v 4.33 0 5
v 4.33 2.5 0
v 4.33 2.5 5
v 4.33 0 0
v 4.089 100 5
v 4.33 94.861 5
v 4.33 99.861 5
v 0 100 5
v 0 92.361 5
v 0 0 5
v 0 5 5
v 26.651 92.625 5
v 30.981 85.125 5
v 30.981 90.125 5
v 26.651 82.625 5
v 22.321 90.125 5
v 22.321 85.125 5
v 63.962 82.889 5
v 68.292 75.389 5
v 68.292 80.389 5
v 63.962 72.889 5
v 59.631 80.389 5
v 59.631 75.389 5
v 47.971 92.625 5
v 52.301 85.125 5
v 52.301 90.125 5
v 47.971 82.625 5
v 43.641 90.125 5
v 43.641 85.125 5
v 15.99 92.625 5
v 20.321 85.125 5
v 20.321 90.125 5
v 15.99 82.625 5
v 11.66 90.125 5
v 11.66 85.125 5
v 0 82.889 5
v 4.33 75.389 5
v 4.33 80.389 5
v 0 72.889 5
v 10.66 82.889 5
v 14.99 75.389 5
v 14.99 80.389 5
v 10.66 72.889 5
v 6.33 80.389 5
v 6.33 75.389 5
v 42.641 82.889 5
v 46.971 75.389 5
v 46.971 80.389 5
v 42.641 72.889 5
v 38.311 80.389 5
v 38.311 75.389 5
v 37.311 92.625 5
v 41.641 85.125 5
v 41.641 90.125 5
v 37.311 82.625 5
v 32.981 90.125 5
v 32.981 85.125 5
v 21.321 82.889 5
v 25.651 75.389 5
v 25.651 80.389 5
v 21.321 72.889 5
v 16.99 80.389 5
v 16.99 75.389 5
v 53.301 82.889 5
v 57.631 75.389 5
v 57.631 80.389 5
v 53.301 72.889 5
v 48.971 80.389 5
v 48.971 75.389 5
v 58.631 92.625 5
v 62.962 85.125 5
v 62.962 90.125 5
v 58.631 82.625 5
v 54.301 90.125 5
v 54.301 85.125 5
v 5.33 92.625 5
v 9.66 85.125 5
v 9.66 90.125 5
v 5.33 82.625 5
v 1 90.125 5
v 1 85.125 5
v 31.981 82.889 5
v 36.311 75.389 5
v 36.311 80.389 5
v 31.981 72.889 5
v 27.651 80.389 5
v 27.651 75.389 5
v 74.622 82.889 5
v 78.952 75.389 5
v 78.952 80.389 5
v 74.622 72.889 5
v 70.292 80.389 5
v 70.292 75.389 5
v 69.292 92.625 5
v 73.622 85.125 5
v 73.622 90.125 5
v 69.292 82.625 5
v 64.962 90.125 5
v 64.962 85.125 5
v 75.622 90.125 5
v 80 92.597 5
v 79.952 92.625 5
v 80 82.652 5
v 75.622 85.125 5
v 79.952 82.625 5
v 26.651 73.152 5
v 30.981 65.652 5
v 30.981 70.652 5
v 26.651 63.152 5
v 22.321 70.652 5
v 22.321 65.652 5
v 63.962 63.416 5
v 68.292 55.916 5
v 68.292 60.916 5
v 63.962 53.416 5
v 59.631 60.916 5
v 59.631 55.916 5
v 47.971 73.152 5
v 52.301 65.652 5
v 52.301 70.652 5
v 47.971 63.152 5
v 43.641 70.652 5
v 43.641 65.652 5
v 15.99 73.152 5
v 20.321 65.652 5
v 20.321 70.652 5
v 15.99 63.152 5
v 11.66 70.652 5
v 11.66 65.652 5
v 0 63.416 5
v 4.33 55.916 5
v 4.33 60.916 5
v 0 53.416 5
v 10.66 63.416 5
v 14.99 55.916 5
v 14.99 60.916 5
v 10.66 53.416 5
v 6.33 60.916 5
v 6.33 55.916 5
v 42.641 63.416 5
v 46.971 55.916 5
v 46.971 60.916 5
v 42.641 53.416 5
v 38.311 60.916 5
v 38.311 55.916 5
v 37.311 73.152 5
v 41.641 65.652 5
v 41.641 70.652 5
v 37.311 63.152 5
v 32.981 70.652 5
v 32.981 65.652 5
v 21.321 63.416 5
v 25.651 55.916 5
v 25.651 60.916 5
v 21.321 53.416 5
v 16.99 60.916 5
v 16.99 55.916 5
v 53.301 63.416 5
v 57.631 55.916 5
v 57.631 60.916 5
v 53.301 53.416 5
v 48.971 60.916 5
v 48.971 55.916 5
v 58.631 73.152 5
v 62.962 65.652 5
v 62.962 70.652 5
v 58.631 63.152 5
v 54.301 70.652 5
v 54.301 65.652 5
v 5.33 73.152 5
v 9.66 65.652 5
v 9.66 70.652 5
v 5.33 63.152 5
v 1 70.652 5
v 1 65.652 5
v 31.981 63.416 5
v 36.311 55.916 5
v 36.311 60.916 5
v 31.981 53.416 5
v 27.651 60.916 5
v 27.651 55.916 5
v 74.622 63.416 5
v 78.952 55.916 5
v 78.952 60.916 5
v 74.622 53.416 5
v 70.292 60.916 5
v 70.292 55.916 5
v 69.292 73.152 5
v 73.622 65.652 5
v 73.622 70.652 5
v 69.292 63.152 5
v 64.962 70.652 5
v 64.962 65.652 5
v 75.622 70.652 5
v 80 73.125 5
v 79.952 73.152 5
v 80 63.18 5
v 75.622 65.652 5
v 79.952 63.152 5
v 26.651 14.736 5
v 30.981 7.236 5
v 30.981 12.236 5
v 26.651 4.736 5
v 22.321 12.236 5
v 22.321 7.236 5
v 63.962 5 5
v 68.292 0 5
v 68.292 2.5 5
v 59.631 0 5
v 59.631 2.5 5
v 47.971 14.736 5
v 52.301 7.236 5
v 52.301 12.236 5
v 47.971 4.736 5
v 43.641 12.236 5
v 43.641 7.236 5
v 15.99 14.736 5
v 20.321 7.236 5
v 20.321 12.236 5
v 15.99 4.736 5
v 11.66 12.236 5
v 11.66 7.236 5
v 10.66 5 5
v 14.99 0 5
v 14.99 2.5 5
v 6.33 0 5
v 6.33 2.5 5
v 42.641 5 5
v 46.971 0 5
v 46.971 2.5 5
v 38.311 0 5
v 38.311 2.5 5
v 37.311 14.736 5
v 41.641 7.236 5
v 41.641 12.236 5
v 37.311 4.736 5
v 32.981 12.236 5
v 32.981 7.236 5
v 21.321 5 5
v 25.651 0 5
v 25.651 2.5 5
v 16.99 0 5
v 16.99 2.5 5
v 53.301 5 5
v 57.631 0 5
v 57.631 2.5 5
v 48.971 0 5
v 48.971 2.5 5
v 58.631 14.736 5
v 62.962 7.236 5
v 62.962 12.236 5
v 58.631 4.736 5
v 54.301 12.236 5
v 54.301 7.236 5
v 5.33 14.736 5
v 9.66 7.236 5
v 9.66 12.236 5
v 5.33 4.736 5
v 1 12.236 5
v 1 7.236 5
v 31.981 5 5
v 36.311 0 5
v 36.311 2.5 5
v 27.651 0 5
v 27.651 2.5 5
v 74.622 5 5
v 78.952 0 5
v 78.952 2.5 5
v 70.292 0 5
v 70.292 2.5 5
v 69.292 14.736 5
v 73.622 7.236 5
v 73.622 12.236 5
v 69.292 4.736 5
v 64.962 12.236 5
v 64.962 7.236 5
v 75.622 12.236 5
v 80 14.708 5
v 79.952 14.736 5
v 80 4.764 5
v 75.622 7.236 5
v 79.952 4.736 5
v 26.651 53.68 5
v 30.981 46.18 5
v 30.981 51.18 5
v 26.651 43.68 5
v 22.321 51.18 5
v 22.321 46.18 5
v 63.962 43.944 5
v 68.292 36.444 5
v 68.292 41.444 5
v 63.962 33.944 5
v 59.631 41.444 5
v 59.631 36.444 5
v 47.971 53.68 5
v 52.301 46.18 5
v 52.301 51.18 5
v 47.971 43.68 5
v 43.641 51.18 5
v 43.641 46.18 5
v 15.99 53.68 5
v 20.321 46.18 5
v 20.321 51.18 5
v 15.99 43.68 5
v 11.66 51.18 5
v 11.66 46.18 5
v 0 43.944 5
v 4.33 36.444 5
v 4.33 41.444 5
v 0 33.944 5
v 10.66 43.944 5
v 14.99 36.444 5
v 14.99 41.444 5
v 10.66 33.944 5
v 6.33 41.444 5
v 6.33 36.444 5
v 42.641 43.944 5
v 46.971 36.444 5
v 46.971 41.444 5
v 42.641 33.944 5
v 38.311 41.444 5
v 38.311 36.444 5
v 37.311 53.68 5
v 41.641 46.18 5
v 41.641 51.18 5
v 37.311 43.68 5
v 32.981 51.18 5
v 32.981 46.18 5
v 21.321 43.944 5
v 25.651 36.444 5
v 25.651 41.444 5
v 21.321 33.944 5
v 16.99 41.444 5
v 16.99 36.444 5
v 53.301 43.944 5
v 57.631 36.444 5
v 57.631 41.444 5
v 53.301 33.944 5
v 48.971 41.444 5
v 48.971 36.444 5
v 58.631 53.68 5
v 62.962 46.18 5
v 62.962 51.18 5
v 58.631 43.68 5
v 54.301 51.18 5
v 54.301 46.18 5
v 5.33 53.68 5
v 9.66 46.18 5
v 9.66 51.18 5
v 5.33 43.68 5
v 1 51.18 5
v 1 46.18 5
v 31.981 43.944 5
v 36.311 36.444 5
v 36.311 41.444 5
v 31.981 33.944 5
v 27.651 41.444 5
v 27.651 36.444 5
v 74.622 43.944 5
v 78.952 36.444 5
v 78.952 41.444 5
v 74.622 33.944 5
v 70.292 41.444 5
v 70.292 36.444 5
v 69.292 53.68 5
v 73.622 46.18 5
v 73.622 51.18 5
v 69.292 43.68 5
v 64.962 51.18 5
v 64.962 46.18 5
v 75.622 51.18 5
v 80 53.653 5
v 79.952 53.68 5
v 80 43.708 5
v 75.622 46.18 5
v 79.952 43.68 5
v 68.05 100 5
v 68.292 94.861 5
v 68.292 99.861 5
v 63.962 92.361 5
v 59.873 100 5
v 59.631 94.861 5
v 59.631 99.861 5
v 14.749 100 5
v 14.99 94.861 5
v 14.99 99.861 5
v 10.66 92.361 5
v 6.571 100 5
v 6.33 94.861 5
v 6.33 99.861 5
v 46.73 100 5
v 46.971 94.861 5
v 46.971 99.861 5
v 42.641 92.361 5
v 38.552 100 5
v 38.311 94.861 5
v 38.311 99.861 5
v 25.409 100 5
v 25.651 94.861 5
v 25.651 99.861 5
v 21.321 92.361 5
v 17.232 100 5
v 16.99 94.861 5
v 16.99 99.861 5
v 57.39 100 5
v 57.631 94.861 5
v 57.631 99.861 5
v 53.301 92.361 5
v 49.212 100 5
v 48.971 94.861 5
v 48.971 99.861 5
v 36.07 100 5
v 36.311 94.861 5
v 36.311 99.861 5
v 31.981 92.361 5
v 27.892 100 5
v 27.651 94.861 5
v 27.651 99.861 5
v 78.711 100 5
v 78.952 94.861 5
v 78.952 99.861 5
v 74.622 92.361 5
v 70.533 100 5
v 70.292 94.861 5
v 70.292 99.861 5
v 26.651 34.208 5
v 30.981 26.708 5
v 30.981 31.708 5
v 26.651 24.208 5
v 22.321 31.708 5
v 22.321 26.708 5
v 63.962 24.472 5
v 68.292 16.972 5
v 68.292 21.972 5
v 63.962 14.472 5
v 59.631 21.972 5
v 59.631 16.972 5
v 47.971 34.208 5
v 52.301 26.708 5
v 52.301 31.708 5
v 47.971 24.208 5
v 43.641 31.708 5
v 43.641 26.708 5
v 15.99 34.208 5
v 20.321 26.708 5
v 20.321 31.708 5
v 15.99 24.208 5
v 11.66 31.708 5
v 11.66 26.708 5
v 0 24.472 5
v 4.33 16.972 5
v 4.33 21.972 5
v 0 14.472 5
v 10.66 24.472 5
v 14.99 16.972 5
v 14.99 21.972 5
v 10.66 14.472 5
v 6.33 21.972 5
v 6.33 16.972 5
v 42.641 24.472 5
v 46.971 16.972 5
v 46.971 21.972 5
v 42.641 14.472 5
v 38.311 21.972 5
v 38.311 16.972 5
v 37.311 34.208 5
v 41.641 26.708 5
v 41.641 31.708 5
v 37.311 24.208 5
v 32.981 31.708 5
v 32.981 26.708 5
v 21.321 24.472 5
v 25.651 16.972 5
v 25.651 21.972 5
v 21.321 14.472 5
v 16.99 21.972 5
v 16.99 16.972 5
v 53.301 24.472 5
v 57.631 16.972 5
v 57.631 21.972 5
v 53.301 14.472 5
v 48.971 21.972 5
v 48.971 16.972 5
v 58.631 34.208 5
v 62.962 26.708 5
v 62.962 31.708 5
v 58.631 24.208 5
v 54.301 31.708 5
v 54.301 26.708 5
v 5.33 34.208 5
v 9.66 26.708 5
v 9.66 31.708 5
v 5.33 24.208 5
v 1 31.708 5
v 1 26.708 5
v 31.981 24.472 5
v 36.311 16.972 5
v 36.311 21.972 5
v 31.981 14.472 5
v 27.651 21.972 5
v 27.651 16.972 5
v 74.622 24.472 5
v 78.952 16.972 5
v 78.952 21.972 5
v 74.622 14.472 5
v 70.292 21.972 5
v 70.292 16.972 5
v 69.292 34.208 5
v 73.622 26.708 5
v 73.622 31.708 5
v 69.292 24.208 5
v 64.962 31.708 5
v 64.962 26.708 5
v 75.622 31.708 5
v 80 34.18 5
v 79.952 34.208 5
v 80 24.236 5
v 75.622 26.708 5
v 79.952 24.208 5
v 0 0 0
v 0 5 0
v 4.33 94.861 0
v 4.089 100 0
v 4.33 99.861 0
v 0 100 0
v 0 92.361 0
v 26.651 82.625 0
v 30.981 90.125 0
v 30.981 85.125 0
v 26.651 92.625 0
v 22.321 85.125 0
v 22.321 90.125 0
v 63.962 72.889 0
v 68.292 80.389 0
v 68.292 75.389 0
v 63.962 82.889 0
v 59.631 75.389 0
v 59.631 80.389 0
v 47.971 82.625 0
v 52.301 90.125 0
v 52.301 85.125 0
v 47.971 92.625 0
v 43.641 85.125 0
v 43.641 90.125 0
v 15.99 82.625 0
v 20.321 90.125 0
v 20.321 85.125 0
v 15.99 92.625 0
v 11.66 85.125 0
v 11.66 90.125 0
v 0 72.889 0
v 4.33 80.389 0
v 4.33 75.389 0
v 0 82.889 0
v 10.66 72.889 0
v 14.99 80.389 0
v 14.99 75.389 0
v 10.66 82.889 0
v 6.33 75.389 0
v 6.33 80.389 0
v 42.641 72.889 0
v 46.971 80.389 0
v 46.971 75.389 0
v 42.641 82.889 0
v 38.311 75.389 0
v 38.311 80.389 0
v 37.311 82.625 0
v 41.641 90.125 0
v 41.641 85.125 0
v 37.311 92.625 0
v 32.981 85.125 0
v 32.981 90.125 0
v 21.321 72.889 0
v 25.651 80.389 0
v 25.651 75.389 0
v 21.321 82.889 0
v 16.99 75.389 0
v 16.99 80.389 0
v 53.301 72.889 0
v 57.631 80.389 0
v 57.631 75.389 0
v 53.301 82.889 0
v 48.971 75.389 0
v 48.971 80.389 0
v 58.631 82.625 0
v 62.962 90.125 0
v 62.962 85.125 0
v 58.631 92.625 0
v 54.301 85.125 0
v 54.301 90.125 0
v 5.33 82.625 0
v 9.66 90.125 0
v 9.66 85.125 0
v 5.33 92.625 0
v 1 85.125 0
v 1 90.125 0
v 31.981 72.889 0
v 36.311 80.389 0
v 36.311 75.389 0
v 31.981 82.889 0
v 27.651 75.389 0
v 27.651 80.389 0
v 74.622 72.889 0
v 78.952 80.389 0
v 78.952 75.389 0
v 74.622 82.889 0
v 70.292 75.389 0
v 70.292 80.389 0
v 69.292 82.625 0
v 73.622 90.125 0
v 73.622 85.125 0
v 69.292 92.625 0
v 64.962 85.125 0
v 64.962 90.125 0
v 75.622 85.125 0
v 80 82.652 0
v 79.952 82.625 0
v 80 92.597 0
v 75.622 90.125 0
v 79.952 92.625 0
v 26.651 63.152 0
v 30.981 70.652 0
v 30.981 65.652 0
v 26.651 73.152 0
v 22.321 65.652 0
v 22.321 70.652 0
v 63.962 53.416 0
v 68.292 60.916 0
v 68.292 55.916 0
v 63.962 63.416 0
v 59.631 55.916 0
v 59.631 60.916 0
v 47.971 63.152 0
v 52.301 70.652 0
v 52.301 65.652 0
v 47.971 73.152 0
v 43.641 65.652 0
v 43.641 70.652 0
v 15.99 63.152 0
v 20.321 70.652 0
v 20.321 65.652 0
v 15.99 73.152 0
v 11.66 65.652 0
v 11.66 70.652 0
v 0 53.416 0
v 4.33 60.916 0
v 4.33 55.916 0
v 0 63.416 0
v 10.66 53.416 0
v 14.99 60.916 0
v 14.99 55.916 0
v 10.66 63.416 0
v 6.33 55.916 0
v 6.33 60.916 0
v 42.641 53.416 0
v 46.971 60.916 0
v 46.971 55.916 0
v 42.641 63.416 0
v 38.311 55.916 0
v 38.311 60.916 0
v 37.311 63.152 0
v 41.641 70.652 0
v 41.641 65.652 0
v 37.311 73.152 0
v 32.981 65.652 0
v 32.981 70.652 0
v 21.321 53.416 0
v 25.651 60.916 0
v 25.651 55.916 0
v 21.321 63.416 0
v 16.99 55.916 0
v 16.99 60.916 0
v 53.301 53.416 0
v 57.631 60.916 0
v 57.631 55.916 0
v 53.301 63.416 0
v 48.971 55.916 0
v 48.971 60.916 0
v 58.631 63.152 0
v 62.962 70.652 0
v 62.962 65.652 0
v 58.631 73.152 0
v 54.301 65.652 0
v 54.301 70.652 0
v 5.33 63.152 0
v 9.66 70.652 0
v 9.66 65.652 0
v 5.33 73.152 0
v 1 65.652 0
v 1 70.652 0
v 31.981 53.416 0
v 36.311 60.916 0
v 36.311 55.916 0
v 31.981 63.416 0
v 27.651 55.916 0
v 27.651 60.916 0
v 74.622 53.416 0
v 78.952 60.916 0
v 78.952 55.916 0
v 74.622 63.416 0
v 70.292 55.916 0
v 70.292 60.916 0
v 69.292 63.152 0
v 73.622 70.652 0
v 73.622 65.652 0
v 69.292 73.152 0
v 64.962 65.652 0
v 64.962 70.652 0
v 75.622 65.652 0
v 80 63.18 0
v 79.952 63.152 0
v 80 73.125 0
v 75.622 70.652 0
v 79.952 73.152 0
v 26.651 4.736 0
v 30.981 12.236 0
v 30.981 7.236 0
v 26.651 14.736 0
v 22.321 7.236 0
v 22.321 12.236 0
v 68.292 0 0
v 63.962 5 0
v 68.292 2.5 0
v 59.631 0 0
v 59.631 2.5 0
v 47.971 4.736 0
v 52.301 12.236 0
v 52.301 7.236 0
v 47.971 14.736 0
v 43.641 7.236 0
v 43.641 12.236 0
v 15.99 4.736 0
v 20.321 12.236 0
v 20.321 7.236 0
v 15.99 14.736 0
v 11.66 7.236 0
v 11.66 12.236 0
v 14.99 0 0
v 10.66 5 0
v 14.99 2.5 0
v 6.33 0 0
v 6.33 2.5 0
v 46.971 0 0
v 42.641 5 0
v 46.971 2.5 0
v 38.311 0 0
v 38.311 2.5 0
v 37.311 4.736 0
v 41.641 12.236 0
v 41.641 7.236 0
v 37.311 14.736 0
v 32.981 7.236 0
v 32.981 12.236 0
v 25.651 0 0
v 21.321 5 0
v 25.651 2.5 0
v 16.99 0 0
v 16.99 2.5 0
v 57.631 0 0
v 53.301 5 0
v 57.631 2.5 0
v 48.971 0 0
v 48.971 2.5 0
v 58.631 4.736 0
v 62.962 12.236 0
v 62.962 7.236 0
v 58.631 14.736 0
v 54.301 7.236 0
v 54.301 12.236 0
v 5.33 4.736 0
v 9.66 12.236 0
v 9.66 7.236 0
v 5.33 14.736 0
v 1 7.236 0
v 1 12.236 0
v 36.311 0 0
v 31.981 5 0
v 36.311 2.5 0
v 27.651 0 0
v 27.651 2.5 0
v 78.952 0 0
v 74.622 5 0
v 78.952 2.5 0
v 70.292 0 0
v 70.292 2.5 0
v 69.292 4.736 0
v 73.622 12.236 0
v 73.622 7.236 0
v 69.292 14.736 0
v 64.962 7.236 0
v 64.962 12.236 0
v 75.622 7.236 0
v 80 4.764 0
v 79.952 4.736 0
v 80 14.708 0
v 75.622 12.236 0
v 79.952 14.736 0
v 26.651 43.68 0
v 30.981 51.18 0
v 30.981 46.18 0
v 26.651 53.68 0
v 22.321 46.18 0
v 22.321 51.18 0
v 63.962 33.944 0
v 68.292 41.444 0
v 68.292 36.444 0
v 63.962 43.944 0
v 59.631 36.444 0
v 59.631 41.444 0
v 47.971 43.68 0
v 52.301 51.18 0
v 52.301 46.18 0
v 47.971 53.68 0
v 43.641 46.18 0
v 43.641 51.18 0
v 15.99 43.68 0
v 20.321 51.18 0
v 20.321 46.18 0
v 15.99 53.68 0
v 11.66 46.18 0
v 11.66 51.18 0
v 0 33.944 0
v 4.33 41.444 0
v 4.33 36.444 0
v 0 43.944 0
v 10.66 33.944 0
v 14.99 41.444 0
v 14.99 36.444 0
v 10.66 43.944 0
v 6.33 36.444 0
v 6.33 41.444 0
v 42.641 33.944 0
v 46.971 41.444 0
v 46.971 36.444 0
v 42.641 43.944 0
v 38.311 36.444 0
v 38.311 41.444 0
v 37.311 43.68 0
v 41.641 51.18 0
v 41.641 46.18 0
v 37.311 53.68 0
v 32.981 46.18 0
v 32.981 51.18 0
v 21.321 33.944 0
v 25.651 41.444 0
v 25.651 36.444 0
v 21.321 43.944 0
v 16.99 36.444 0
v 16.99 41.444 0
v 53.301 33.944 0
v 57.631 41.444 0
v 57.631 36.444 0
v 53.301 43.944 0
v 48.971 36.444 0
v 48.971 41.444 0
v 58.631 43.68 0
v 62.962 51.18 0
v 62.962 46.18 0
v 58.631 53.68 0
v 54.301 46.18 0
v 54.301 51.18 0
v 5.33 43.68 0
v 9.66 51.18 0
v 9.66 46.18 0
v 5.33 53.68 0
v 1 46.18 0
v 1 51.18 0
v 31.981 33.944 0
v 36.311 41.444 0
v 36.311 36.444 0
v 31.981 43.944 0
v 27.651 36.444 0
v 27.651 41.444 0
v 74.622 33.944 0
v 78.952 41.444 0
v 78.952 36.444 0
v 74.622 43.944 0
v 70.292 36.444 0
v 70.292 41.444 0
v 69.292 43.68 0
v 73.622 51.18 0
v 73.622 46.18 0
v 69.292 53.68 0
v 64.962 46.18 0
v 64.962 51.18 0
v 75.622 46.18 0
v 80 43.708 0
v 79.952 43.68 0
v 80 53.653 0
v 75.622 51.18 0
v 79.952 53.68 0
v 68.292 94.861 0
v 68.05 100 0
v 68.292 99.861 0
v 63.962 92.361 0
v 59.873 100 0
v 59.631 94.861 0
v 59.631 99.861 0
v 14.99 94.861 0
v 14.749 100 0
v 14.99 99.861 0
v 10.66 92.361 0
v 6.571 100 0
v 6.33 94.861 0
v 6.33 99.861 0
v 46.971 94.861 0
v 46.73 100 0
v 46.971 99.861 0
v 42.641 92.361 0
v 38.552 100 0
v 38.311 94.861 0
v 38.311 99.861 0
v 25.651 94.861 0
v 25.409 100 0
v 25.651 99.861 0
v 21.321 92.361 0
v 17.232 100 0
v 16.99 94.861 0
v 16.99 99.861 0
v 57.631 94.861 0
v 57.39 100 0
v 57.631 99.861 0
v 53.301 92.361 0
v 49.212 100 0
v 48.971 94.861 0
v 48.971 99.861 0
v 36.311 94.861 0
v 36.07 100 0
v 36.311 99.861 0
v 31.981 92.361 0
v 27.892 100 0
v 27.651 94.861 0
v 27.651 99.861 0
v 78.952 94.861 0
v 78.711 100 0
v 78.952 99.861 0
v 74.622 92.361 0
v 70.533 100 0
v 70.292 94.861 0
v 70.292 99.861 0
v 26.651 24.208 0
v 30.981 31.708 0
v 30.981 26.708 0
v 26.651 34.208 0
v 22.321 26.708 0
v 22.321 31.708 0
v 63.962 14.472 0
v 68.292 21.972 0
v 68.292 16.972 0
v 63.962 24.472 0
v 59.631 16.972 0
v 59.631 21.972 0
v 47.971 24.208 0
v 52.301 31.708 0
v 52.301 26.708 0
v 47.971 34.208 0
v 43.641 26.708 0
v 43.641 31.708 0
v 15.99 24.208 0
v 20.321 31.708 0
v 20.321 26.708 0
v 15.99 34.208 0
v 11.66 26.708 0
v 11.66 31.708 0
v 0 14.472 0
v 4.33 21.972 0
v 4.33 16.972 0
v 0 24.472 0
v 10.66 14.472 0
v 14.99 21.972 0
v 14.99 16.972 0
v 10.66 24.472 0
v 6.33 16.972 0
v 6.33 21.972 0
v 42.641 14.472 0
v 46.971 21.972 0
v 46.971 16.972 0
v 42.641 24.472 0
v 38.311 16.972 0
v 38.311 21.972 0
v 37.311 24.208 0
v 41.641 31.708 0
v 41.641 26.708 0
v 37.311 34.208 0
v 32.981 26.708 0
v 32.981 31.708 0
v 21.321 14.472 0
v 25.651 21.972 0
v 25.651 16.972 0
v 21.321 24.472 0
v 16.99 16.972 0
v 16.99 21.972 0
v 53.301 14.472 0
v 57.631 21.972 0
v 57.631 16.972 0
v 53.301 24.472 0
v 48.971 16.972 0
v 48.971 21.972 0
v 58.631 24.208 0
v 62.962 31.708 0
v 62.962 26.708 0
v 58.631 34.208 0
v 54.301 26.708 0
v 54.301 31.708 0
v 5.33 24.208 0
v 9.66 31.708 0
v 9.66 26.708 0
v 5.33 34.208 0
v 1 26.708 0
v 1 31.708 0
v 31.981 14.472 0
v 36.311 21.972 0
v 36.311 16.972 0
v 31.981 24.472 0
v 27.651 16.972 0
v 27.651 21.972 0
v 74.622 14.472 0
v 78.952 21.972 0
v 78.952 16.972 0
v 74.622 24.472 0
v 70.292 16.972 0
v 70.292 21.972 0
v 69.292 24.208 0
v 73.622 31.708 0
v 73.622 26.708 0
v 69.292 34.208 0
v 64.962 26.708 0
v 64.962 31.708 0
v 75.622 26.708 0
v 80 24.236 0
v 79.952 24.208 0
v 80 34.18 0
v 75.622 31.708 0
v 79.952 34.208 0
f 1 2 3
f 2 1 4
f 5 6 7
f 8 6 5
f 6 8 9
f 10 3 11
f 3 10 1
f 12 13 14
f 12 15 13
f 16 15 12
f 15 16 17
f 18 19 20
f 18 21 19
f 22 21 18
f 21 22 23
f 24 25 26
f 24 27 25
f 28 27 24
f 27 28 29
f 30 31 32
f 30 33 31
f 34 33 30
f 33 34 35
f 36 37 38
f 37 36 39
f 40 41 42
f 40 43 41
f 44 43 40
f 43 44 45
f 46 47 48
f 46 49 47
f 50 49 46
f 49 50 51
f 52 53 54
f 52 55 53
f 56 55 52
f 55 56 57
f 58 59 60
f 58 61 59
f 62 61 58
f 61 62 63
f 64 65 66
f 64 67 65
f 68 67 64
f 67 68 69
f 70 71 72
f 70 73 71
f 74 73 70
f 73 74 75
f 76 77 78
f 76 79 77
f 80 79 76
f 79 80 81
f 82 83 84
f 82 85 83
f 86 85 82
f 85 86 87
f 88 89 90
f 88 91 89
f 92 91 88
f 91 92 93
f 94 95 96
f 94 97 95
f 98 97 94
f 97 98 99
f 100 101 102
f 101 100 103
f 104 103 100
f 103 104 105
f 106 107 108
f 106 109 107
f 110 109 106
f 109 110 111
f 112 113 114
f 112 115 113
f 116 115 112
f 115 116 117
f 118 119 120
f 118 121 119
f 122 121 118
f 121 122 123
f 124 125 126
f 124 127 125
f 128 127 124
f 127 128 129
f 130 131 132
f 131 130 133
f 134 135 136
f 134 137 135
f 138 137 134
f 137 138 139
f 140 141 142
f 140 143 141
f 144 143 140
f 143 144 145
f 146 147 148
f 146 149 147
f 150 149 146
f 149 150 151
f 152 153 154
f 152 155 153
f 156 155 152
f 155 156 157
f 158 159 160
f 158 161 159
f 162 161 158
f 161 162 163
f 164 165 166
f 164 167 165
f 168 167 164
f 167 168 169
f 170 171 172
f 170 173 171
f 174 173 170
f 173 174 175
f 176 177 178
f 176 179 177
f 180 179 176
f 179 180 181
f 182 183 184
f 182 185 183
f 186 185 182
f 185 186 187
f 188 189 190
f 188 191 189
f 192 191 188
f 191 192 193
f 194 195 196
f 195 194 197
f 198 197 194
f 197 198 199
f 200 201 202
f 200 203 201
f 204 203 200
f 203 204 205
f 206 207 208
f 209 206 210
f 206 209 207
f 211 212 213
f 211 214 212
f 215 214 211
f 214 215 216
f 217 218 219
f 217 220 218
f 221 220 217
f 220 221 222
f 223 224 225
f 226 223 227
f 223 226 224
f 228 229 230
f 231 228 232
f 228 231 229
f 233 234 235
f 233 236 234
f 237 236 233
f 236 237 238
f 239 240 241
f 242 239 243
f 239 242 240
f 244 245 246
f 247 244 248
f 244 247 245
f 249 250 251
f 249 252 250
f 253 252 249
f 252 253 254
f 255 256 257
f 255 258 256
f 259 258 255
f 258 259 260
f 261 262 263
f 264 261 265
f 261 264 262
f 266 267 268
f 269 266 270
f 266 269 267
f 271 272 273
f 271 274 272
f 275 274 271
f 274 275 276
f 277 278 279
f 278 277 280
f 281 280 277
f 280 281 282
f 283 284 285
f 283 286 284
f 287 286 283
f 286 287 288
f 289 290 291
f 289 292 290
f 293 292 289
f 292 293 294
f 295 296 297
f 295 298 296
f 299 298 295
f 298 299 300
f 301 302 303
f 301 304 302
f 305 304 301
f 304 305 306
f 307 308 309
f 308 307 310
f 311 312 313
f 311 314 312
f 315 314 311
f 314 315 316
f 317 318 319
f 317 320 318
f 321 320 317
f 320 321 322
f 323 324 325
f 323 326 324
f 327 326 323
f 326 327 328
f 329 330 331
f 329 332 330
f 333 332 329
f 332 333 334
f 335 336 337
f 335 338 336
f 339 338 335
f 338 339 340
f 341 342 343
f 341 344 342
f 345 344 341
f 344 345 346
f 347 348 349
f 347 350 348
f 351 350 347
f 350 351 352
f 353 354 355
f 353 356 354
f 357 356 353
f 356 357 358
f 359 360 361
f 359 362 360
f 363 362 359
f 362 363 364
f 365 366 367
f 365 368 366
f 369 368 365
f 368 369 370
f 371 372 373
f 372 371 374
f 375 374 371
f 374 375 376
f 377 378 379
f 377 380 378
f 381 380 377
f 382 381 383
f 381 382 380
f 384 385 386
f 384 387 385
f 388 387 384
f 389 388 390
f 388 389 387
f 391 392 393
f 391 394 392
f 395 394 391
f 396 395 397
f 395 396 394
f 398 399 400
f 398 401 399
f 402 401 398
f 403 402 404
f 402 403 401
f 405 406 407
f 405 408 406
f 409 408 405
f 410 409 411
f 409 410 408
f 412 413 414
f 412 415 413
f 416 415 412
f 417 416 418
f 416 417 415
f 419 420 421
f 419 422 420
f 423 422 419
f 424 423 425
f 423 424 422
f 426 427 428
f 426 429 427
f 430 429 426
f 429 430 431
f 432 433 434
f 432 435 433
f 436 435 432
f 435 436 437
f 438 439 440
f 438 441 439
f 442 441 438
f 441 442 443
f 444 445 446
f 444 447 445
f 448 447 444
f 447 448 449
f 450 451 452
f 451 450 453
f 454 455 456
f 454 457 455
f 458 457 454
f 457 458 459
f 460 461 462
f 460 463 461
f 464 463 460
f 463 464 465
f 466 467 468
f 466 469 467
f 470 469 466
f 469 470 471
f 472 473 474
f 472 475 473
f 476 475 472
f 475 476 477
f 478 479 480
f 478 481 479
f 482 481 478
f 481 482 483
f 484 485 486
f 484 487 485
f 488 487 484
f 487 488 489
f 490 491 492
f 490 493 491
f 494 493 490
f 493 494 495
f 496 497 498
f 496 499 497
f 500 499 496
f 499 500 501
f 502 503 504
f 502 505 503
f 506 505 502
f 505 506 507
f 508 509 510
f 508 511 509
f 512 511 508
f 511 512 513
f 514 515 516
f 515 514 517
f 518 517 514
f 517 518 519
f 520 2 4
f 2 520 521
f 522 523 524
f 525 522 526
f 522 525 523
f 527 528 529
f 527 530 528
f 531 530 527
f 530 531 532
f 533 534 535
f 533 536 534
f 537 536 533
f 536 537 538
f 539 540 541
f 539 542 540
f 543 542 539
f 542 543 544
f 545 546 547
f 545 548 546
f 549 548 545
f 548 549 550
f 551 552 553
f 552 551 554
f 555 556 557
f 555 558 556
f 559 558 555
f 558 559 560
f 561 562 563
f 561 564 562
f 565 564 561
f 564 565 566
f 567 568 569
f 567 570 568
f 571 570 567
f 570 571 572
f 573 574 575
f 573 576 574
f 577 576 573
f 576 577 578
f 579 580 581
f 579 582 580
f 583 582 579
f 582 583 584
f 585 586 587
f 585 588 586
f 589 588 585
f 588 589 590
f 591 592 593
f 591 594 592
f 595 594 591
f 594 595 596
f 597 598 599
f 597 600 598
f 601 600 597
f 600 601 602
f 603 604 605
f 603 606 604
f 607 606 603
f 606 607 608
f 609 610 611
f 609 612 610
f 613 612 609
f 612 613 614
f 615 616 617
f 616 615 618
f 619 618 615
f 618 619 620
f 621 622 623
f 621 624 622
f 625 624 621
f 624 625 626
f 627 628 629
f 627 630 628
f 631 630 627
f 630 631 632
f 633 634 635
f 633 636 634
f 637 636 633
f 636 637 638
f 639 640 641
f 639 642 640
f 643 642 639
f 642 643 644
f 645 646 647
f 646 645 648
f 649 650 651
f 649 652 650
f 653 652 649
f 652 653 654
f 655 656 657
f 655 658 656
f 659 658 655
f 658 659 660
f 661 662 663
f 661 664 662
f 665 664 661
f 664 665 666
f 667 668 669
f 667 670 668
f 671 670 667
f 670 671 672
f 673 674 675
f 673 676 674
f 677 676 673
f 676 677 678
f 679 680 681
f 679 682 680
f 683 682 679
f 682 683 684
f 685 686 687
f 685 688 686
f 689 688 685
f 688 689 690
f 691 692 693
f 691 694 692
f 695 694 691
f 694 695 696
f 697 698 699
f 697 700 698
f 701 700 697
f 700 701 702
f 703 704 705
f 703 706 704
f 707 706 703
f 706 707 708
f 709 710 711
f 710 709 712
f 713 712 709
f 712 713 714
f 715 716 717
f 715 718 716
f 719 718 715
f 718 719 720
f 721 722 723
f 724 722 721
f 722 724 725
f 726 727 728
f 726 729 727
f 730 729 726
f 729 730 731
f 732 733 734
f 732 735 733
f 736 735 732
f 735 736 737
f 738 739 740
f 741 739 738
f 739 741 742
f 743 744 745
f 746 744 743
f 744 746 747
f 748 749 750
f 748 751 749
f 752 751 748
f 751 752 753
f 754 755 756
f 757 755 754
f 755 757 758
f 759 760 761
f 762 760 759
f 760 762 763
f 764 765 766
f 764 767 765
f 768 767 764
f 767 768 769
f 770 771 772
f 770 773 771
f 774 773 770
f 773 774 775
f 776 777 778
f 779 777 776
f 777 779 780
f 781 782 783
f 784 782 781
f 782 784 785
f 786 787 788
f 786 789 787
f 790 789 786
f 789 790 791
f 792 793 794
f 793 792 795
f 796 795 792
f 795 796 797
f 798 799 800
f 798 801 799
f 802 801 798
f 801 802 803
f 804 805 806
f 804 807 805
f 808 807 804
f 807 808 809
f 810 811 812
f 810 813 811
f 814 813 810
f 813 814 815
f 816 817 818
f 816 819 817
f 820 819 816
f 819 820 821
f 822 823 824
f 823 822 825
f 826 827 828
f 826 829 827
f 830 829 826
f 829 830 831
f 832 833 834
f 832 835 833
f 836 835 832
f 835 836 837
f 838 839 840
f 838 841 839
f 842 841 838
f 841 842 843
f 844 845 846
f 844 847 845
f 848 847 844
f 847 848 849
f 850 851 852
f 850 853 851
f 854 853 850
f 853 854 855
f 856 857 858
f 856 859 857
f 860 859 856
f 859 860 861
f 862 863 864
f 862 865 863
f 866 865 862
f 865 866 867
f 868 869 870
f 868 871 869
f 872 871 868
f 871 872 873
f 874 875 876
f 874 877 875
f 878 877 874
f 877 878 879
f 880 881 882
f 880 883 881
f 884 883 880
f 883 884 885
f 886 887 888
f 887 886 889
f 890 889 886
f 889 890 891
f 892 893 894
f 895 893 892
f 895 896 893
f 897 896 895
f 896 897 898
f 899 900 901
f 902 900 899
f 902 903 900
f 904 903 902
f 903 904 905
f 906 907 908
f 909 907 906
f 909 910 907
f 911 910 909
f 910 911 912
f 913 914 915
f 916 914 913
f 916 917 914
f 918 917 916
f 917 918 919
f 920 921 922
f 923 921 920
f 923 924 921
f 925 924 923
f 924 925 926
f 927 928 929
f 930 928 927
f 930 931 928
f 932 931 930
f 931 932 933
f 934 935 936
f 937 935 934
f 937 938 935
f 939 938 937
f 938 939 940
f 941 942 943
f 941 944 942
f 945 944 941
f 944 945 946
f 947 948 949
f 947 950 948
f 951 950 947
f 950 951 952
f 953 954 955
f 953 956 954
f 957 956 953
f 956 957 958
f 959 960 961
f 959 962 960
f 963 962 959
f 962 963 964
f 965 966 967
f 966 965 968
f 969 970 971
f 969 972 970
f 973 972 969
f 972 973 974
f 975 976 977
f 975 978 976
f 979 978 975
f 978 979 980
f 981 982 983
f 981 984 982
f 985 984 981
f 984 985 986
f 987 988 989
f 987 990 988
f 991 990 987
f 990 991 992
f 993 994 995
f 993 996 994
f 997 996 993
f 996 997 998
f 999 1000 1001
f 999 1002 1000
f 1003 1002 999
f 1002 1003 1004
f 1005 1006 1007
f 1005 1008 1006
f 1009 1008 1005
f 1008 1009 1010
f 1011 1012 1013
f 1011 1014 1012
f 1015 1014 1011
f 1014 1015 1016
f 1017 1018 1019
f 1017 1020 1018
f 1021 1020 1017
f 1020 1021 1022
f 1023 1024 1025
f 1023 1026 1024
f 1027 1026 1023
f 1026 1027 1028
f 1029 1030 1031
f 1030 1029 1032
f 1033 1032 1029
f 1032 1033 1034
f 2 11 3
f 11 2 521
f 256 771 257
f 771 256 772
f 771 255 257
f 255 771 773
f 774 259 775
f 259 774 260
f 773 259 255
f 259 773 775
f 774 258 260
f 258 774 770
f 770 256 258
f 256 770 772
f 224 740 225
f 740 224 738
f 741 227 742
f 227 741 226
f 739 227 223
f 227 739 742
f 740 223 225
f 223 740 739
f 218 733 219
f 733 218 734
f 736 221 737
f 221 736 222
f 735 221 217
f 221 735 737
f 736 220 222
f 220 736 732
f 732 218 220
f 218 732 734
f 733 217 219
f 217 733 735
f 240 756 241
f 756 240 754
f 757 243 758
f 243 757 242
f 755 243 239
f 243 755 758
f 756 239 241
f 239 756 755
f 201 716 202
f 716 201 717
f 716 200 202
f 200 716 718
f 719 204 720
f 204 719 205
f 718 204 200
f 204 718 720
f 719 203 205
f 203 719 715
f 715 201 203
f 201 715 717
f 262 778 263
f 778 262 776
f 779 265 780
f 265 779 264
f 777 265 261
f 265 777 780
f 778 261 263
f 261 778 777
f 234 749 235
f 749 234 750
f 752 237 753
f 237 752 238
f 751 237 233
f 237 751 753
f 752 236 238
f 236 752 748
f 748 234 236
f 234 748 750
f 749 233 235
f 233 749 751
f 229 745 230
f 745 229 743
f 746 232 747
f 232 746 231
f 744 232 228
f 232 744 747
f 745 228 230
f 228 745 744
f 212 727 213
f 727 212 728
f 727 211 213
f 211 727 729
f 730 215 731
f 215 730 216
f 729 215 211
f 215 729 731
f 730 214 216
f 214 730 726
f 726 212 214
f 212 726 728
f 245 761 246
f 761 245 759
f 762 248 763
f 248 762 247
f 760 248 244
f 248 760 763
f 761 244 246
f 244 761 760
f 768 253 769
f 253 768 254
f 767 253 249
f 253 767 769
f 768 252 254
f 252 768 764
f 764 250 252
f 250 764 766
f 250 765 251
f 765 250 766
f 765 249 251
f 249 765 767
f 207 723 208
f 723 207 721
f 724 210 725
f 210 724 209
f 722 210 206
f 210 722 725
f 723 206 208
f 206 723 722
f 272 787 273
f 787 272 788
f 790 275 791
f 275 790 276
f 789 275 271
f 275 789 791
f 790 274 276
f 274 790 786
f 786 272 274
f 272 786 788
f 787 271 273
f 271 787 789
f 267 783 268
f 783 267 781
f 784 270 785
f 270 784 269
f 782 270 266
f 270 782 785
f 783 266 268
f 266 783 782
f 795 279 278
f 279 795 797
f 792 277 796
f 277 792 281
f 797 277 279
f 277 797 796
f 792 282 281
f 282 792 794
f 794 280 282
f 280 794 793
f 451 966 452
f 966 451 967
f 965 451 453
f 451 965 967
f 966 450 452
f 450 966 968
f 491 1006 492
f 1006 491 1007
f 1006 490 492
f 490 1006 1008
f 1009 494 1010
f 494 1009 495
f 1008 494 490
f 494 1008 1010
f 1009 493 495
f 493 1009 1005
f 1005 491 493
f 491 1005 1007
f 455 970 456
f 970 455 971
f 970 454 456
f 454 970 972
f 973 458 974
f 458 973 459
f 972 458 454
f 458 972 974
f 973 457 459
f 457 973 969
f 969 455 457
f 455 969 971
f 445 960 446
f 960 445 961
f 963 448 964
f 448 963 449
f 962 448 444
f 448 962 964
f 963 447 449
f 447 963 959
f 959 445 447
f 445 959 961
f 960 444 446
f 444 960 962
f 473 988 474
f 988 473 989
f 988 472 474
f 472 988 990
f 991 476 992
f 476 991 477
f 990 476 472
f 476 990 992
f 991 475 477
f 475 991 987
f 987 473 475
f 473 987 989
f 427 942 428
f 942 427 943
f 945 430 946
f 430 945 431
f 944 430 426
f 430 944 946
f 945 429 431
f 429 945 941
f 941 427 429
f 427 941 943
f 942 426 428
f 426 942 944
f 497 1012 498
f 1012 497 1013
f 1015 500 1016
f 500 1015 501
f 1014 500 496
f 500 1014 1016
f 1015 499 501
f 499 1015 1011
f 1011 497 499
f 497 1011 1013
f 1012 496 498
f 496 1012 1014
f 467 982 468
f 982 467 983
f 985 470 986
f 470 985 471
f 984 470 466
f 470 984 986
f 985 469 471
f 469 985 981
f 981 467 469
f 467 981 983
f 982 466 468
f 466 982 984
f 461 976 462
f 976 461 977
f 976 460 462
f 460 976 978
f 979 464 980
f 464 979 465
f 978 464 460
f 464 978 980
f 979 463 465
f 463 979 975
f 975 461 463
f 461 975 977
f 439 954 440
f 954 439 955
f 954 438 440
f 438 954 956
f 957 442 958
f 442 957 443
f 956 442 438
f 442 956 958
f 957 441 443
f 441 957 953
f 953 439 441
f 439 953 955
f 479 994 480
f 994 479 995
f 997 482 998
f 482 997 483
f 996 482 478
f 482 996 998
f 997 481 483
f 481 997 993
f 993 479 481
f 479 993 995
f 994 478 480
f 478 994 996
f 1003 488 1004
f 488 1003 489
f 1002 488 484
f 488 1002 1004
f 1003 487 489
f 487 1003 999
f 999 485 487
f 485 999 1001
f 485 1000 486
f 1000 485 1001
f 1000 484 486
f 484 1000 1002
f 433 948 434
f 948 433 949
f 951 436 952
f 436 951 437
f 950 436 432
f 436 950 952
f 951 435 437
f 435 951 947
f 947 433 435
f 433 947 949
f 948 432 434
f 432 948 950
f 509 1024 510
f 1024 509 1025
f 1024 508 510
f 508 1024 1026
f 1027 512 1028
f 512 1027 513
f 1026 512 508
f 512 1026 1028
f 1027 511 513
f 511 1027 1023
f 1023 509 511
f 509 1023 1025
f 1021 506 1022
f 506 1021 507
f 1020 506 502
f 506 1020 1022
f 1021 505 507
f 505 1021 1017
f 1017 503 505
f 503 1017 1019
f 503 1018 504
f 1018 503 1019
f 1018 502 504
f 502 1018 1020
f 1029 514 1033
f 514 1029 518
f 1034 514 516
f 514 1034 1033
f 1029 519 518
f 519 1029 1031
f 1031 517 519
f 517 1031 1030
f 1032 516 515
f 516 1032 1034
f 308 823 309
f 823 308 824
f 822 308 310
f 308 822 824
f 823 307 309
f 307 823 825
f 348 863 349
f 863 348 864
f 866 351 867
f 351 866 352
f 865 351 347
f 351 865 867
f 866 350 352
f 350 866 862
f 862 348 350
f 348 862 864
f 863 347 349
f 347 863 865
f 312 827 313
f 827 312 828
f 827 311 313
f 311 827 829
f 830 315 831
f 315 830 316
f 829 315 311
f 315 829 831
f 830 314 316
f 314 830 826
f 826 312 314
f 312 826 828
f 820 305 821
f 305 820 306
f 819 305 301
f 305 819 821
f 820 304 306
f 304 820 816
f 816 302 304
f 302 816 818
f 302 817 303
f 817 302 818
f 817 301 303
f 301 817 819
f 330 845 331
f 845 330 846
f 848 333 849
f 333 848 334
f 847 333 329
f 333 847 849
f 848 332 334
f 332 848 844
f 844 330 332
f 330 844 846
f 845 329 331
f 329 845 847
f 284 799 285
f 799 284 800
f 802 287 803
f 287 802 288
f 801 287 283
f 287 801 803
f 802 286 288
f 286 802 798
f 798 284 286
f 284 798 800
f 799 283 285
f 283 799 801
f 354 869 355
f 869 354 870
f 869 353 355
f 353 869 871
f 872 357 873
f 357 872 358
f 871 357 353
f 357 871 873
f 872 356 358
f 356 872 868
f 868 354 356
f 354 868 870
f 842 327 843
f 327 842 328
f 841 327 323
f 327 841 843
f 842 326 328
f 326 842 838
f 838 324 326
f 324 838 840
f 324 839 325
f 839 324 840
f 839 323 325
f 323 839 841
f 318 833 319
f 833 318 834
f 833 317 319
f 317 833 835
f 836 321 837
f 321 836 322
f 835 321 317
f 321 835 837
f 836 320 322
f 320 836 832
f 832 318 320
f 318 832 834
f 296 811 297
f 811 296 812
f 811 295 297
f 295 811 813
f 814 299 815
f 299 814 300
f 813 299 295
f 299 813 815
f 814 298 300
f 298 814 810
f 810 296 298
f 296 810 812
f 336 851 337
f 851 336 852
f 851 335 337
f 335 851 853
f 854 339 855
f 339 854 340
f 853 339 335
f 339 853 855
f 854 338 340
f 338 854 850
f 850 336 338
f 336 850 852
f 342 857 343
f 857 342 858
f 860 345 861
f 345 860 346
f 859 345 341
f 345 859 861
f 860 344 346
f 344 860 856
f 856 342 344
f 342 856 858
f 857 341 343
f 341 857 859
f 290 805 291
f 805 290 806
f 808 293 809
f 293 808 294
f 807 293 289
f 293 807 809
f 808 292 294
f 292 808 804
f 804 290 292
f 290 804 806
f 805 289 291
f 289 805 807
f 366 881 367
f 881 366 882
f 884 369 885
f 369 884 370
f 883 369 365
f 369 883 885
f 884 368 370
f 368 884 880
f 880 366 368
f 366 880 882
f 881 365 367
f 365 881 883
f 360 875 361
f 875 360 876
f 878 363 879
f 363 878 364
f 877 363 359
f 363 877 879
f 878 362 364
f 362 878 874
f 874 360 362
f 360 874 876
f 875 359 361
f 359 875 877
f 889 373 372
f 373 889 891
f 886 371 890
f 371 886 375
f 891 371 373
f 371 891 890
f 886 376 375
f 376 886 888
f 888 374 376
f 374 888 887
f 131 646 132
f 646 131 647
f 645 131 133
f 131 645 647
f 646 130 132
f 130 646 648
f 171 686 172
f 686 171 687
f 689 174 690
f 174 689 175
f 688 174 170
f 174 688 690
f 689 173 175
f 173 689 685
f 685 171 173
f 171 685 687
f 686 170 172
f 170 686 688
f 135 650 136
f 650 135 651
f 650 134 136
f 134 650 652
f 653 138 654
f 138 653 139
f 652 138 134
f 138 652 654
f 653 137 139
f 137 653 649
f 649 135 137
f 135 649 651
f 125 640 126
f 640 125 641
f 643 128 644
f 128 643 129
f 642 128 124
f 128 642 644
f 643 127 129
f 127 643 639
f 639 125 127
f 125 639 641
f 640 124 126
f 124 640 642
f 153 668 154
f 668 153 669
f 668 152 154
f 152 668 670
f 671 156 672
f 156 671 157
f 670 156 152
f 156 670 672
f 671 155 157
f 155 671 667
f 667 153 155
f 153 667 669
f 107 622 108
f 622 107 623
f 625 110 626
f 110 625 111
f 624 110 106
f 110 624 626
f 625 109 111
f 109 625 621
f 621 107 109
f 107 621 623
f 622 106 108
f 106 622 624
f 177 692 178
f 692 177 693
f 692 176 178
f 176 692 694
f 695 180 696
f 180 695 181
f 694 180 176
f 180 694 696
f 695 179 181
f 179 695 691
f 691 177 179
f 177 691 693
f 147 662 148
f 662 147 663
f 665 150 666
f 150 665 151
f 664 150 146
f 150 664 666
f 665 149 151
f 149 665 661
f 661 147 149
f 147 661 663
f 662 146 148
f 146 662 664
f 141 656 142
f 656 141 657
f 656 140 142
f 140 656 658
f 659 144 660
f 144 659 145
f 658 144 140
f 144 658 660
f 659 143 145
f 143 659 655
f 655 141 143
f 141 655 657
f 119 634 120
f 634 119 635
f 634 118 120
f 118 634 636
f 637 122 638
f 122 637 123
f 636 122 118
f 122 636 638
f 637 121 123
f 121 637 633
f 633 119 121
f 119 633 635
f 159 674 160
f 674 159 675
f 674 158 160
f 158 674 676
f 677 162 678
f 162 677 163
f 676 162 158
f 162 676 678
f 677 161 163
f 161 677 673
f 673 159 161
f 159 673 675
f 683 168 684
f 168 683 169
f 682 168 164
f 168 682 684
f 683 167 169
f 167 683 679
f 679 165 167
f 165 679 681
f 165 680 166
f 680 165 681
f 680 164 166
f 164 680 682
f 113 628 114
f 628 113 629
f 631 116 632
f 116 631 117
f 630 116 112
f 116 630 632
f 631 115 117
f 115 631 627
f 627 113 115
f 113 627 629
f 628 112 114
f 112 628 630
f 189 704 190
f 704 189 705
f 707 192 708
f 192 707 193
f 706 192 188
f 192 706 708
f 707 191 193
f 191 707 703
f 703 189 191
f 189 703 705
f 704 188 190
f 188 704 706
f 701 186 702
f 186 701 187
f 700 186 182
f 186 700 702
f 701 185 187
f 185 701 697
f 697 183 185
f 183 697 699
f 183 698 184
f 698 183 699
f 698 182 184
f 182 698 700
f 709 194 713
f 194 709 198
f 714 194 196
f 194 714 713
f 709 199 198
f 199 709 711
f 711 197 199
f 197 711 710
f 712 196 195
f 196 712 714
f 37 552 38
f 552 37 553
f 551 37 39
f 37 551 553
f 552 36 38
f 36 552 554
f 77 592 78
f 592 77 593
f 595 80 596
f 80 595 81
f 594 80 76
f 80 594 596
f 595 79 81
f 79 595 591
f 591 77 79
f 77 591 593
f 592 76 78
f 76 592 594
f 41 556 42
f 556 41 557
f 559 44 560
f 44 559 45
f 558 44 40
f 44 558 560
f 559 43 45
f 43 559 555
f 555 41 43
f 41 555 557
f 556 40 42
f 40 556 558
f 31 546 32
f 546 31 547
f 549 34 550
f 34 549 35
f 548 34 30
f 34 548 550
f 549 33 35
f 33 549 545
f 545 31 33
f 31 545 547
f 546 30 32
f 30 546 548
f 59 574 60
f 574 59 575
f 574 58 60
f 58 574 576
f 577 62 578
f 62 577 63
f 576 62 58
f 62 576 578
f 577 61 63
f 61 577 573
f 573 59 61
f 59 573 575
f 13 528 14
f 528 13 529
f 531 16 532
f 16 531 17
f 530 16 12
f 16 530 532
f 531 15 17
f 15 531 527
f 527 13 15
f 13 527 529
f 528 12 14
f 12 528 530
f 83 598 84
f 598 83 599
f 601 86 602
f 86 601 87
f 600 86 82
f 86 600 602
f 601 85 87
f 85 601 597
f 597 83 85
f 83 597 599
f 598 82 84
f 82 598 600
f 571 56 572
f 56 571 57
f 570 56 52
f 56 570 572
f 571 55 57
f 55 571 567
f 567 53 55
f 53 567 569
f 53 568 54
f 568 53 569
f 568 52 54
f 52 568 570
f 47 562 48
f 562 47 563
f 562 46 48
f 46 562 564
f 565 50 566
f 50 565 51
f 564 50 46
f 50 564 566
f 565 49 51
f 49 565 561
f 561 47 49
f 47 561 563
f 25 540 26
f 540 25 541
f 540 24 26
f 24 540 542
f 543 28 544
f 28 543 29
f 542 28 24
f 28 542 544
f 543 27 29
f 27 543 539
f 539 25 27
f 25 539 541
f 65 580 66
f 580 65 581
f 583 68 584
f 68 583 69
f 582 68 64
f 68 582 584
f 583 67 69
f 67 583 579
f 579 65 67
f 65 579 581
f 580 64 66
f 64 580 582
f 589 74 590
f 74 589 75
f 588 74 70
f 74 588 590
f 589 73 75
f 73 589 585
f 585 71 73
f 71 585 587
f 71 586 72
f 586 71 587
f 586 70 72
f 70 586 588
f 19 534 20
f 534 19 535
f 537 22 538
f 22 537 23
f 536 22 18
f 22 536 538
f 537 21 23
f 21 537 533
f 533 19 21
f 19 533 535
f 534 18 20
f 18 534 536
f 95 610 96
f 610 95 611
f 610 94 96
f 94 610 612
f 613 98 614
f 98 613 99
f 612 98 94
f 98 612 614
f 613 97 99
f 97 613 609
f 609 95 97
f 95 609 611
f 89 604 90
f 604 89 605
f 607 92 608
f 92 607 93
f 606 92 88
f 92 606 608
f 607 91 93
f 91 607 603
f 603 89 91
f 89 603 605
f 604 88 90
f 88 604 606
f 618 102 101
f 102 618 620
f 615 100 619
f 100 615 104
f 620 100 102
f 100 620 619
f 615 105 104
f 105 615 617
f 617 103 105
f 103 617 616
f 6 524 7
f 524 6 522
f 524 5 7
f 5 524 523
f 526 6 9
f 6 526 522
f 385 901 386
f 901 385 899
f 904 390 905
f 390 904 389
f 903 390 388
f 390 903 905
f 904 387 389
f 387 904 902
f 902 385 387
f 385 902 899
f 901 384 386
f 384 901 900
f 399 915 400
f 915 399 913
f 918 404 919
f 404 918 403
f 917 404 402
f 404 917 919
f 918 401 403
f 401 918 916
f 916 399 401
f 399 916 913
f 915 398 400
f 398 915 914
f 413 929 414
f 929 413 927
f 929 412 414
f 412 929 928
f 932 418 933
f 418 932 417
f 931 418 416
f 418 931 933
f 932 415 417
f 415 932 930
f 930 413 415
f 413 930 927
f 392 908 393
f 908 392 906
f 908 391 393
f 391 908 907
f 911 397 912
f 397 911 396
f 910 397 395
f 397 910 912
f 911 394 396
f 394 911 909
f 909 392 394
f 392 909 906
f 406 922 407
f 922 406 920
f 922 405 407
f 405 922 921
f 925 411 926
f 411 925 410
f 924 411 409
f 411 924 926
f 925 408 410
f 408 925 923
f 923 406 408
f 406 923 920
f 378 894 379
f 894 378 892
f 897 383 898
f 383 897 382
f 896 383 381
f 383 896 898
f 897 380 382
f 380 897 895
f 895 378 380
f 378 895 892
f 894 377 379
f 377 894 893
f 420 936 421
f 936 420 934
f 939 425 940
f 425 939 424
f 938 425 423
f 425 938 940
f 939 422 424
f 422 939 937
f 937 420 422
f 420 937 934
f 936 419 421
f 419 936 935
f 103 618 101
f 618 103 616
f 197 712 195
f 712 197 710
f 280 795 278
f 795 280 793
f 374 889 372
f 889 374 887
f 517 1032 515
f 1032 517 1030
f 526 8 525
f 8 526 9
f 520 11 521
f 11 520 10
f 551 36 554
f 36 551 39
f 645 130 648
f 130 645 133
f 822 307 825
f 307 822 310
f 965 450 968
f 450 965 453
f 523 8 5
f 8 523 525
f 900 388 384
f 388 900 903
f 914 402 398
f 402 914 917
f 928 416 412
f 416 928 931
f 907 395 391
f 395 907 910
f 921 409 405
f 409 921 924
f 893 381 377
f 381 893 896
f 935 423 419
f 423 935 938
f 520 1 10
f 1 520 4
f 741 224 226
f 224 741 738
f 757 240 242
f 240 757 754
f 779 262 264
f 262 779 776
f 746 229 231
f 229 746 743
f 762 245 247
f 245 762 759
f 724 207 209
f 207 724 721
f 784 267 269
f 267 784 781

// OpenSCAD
$fn = 50;

module hexagon(extrusion_height, radius) {
  rotate([ 0, 0, 90 ]) cylinder($fn = 6, h = extrusion_height, r = radius);
}

module hexagons(extrusion_height, radius, distance, x_reps, y_reps) {
  hexagon_height = radius * 2;
  side = radius;

  // Using the pythagorean theorem:
  //
  //   (Width/2)^2 + (r/2)^2 = r^2
  //
  hexagon_width = sqrt(3) * radius;

  // Using the pythagorean theorem:
  //
  //   VertDist^2 + (Dist/2)^2 = Dist^2
  //
  vertical_distance = sqrt(1.25) * distance;

  pattern_height = hexagon_height + vertical_distance * 2 + side;
  pattern_width = hexagon_width + distance;

  for (index_y = [0:1:y_reps - 1]) {
    y1 = index_y * pattern_height;
    y2 = y1 + 0.75 * hexagon_height + vertical_distance;

    for (index_x = [0:1:x_reps - 1]) {
      x1 = index_x * pattern_width;
      translate([ x1, y1, 0 ]) hexagon(extrusion_height, radius);

      x2 = x1 + hexagon_width / 2 + distance / 2;

      translate([ x2, y2, 0 ]) hexagon(extrusion_height, radius);
    }
  }
}

module blocked_hexagons(extrusion_height, radius, distance, width, height) {
  hexagon_height = radius * 2;
  hexagon_width = sqrt(3) * radius;
  x_reps = ceil(width / (hexagon_width + distance)) + 1;
  y_reps = ceil(height / (hexagon_height + distance)) + 1;

  intersection() {
    cube([ width, height, extrusion_height ]);
    hexagons(extrusion_height, radius, distance, x_reps, y_reps);
  }
}

// hexagons(5, 5, distance=2, x_reps=20, y_reps=20);
blocked_hexagons(extrusion_height = 5, radius = 5, distance = 2, width = 80,
                 height = 100);
